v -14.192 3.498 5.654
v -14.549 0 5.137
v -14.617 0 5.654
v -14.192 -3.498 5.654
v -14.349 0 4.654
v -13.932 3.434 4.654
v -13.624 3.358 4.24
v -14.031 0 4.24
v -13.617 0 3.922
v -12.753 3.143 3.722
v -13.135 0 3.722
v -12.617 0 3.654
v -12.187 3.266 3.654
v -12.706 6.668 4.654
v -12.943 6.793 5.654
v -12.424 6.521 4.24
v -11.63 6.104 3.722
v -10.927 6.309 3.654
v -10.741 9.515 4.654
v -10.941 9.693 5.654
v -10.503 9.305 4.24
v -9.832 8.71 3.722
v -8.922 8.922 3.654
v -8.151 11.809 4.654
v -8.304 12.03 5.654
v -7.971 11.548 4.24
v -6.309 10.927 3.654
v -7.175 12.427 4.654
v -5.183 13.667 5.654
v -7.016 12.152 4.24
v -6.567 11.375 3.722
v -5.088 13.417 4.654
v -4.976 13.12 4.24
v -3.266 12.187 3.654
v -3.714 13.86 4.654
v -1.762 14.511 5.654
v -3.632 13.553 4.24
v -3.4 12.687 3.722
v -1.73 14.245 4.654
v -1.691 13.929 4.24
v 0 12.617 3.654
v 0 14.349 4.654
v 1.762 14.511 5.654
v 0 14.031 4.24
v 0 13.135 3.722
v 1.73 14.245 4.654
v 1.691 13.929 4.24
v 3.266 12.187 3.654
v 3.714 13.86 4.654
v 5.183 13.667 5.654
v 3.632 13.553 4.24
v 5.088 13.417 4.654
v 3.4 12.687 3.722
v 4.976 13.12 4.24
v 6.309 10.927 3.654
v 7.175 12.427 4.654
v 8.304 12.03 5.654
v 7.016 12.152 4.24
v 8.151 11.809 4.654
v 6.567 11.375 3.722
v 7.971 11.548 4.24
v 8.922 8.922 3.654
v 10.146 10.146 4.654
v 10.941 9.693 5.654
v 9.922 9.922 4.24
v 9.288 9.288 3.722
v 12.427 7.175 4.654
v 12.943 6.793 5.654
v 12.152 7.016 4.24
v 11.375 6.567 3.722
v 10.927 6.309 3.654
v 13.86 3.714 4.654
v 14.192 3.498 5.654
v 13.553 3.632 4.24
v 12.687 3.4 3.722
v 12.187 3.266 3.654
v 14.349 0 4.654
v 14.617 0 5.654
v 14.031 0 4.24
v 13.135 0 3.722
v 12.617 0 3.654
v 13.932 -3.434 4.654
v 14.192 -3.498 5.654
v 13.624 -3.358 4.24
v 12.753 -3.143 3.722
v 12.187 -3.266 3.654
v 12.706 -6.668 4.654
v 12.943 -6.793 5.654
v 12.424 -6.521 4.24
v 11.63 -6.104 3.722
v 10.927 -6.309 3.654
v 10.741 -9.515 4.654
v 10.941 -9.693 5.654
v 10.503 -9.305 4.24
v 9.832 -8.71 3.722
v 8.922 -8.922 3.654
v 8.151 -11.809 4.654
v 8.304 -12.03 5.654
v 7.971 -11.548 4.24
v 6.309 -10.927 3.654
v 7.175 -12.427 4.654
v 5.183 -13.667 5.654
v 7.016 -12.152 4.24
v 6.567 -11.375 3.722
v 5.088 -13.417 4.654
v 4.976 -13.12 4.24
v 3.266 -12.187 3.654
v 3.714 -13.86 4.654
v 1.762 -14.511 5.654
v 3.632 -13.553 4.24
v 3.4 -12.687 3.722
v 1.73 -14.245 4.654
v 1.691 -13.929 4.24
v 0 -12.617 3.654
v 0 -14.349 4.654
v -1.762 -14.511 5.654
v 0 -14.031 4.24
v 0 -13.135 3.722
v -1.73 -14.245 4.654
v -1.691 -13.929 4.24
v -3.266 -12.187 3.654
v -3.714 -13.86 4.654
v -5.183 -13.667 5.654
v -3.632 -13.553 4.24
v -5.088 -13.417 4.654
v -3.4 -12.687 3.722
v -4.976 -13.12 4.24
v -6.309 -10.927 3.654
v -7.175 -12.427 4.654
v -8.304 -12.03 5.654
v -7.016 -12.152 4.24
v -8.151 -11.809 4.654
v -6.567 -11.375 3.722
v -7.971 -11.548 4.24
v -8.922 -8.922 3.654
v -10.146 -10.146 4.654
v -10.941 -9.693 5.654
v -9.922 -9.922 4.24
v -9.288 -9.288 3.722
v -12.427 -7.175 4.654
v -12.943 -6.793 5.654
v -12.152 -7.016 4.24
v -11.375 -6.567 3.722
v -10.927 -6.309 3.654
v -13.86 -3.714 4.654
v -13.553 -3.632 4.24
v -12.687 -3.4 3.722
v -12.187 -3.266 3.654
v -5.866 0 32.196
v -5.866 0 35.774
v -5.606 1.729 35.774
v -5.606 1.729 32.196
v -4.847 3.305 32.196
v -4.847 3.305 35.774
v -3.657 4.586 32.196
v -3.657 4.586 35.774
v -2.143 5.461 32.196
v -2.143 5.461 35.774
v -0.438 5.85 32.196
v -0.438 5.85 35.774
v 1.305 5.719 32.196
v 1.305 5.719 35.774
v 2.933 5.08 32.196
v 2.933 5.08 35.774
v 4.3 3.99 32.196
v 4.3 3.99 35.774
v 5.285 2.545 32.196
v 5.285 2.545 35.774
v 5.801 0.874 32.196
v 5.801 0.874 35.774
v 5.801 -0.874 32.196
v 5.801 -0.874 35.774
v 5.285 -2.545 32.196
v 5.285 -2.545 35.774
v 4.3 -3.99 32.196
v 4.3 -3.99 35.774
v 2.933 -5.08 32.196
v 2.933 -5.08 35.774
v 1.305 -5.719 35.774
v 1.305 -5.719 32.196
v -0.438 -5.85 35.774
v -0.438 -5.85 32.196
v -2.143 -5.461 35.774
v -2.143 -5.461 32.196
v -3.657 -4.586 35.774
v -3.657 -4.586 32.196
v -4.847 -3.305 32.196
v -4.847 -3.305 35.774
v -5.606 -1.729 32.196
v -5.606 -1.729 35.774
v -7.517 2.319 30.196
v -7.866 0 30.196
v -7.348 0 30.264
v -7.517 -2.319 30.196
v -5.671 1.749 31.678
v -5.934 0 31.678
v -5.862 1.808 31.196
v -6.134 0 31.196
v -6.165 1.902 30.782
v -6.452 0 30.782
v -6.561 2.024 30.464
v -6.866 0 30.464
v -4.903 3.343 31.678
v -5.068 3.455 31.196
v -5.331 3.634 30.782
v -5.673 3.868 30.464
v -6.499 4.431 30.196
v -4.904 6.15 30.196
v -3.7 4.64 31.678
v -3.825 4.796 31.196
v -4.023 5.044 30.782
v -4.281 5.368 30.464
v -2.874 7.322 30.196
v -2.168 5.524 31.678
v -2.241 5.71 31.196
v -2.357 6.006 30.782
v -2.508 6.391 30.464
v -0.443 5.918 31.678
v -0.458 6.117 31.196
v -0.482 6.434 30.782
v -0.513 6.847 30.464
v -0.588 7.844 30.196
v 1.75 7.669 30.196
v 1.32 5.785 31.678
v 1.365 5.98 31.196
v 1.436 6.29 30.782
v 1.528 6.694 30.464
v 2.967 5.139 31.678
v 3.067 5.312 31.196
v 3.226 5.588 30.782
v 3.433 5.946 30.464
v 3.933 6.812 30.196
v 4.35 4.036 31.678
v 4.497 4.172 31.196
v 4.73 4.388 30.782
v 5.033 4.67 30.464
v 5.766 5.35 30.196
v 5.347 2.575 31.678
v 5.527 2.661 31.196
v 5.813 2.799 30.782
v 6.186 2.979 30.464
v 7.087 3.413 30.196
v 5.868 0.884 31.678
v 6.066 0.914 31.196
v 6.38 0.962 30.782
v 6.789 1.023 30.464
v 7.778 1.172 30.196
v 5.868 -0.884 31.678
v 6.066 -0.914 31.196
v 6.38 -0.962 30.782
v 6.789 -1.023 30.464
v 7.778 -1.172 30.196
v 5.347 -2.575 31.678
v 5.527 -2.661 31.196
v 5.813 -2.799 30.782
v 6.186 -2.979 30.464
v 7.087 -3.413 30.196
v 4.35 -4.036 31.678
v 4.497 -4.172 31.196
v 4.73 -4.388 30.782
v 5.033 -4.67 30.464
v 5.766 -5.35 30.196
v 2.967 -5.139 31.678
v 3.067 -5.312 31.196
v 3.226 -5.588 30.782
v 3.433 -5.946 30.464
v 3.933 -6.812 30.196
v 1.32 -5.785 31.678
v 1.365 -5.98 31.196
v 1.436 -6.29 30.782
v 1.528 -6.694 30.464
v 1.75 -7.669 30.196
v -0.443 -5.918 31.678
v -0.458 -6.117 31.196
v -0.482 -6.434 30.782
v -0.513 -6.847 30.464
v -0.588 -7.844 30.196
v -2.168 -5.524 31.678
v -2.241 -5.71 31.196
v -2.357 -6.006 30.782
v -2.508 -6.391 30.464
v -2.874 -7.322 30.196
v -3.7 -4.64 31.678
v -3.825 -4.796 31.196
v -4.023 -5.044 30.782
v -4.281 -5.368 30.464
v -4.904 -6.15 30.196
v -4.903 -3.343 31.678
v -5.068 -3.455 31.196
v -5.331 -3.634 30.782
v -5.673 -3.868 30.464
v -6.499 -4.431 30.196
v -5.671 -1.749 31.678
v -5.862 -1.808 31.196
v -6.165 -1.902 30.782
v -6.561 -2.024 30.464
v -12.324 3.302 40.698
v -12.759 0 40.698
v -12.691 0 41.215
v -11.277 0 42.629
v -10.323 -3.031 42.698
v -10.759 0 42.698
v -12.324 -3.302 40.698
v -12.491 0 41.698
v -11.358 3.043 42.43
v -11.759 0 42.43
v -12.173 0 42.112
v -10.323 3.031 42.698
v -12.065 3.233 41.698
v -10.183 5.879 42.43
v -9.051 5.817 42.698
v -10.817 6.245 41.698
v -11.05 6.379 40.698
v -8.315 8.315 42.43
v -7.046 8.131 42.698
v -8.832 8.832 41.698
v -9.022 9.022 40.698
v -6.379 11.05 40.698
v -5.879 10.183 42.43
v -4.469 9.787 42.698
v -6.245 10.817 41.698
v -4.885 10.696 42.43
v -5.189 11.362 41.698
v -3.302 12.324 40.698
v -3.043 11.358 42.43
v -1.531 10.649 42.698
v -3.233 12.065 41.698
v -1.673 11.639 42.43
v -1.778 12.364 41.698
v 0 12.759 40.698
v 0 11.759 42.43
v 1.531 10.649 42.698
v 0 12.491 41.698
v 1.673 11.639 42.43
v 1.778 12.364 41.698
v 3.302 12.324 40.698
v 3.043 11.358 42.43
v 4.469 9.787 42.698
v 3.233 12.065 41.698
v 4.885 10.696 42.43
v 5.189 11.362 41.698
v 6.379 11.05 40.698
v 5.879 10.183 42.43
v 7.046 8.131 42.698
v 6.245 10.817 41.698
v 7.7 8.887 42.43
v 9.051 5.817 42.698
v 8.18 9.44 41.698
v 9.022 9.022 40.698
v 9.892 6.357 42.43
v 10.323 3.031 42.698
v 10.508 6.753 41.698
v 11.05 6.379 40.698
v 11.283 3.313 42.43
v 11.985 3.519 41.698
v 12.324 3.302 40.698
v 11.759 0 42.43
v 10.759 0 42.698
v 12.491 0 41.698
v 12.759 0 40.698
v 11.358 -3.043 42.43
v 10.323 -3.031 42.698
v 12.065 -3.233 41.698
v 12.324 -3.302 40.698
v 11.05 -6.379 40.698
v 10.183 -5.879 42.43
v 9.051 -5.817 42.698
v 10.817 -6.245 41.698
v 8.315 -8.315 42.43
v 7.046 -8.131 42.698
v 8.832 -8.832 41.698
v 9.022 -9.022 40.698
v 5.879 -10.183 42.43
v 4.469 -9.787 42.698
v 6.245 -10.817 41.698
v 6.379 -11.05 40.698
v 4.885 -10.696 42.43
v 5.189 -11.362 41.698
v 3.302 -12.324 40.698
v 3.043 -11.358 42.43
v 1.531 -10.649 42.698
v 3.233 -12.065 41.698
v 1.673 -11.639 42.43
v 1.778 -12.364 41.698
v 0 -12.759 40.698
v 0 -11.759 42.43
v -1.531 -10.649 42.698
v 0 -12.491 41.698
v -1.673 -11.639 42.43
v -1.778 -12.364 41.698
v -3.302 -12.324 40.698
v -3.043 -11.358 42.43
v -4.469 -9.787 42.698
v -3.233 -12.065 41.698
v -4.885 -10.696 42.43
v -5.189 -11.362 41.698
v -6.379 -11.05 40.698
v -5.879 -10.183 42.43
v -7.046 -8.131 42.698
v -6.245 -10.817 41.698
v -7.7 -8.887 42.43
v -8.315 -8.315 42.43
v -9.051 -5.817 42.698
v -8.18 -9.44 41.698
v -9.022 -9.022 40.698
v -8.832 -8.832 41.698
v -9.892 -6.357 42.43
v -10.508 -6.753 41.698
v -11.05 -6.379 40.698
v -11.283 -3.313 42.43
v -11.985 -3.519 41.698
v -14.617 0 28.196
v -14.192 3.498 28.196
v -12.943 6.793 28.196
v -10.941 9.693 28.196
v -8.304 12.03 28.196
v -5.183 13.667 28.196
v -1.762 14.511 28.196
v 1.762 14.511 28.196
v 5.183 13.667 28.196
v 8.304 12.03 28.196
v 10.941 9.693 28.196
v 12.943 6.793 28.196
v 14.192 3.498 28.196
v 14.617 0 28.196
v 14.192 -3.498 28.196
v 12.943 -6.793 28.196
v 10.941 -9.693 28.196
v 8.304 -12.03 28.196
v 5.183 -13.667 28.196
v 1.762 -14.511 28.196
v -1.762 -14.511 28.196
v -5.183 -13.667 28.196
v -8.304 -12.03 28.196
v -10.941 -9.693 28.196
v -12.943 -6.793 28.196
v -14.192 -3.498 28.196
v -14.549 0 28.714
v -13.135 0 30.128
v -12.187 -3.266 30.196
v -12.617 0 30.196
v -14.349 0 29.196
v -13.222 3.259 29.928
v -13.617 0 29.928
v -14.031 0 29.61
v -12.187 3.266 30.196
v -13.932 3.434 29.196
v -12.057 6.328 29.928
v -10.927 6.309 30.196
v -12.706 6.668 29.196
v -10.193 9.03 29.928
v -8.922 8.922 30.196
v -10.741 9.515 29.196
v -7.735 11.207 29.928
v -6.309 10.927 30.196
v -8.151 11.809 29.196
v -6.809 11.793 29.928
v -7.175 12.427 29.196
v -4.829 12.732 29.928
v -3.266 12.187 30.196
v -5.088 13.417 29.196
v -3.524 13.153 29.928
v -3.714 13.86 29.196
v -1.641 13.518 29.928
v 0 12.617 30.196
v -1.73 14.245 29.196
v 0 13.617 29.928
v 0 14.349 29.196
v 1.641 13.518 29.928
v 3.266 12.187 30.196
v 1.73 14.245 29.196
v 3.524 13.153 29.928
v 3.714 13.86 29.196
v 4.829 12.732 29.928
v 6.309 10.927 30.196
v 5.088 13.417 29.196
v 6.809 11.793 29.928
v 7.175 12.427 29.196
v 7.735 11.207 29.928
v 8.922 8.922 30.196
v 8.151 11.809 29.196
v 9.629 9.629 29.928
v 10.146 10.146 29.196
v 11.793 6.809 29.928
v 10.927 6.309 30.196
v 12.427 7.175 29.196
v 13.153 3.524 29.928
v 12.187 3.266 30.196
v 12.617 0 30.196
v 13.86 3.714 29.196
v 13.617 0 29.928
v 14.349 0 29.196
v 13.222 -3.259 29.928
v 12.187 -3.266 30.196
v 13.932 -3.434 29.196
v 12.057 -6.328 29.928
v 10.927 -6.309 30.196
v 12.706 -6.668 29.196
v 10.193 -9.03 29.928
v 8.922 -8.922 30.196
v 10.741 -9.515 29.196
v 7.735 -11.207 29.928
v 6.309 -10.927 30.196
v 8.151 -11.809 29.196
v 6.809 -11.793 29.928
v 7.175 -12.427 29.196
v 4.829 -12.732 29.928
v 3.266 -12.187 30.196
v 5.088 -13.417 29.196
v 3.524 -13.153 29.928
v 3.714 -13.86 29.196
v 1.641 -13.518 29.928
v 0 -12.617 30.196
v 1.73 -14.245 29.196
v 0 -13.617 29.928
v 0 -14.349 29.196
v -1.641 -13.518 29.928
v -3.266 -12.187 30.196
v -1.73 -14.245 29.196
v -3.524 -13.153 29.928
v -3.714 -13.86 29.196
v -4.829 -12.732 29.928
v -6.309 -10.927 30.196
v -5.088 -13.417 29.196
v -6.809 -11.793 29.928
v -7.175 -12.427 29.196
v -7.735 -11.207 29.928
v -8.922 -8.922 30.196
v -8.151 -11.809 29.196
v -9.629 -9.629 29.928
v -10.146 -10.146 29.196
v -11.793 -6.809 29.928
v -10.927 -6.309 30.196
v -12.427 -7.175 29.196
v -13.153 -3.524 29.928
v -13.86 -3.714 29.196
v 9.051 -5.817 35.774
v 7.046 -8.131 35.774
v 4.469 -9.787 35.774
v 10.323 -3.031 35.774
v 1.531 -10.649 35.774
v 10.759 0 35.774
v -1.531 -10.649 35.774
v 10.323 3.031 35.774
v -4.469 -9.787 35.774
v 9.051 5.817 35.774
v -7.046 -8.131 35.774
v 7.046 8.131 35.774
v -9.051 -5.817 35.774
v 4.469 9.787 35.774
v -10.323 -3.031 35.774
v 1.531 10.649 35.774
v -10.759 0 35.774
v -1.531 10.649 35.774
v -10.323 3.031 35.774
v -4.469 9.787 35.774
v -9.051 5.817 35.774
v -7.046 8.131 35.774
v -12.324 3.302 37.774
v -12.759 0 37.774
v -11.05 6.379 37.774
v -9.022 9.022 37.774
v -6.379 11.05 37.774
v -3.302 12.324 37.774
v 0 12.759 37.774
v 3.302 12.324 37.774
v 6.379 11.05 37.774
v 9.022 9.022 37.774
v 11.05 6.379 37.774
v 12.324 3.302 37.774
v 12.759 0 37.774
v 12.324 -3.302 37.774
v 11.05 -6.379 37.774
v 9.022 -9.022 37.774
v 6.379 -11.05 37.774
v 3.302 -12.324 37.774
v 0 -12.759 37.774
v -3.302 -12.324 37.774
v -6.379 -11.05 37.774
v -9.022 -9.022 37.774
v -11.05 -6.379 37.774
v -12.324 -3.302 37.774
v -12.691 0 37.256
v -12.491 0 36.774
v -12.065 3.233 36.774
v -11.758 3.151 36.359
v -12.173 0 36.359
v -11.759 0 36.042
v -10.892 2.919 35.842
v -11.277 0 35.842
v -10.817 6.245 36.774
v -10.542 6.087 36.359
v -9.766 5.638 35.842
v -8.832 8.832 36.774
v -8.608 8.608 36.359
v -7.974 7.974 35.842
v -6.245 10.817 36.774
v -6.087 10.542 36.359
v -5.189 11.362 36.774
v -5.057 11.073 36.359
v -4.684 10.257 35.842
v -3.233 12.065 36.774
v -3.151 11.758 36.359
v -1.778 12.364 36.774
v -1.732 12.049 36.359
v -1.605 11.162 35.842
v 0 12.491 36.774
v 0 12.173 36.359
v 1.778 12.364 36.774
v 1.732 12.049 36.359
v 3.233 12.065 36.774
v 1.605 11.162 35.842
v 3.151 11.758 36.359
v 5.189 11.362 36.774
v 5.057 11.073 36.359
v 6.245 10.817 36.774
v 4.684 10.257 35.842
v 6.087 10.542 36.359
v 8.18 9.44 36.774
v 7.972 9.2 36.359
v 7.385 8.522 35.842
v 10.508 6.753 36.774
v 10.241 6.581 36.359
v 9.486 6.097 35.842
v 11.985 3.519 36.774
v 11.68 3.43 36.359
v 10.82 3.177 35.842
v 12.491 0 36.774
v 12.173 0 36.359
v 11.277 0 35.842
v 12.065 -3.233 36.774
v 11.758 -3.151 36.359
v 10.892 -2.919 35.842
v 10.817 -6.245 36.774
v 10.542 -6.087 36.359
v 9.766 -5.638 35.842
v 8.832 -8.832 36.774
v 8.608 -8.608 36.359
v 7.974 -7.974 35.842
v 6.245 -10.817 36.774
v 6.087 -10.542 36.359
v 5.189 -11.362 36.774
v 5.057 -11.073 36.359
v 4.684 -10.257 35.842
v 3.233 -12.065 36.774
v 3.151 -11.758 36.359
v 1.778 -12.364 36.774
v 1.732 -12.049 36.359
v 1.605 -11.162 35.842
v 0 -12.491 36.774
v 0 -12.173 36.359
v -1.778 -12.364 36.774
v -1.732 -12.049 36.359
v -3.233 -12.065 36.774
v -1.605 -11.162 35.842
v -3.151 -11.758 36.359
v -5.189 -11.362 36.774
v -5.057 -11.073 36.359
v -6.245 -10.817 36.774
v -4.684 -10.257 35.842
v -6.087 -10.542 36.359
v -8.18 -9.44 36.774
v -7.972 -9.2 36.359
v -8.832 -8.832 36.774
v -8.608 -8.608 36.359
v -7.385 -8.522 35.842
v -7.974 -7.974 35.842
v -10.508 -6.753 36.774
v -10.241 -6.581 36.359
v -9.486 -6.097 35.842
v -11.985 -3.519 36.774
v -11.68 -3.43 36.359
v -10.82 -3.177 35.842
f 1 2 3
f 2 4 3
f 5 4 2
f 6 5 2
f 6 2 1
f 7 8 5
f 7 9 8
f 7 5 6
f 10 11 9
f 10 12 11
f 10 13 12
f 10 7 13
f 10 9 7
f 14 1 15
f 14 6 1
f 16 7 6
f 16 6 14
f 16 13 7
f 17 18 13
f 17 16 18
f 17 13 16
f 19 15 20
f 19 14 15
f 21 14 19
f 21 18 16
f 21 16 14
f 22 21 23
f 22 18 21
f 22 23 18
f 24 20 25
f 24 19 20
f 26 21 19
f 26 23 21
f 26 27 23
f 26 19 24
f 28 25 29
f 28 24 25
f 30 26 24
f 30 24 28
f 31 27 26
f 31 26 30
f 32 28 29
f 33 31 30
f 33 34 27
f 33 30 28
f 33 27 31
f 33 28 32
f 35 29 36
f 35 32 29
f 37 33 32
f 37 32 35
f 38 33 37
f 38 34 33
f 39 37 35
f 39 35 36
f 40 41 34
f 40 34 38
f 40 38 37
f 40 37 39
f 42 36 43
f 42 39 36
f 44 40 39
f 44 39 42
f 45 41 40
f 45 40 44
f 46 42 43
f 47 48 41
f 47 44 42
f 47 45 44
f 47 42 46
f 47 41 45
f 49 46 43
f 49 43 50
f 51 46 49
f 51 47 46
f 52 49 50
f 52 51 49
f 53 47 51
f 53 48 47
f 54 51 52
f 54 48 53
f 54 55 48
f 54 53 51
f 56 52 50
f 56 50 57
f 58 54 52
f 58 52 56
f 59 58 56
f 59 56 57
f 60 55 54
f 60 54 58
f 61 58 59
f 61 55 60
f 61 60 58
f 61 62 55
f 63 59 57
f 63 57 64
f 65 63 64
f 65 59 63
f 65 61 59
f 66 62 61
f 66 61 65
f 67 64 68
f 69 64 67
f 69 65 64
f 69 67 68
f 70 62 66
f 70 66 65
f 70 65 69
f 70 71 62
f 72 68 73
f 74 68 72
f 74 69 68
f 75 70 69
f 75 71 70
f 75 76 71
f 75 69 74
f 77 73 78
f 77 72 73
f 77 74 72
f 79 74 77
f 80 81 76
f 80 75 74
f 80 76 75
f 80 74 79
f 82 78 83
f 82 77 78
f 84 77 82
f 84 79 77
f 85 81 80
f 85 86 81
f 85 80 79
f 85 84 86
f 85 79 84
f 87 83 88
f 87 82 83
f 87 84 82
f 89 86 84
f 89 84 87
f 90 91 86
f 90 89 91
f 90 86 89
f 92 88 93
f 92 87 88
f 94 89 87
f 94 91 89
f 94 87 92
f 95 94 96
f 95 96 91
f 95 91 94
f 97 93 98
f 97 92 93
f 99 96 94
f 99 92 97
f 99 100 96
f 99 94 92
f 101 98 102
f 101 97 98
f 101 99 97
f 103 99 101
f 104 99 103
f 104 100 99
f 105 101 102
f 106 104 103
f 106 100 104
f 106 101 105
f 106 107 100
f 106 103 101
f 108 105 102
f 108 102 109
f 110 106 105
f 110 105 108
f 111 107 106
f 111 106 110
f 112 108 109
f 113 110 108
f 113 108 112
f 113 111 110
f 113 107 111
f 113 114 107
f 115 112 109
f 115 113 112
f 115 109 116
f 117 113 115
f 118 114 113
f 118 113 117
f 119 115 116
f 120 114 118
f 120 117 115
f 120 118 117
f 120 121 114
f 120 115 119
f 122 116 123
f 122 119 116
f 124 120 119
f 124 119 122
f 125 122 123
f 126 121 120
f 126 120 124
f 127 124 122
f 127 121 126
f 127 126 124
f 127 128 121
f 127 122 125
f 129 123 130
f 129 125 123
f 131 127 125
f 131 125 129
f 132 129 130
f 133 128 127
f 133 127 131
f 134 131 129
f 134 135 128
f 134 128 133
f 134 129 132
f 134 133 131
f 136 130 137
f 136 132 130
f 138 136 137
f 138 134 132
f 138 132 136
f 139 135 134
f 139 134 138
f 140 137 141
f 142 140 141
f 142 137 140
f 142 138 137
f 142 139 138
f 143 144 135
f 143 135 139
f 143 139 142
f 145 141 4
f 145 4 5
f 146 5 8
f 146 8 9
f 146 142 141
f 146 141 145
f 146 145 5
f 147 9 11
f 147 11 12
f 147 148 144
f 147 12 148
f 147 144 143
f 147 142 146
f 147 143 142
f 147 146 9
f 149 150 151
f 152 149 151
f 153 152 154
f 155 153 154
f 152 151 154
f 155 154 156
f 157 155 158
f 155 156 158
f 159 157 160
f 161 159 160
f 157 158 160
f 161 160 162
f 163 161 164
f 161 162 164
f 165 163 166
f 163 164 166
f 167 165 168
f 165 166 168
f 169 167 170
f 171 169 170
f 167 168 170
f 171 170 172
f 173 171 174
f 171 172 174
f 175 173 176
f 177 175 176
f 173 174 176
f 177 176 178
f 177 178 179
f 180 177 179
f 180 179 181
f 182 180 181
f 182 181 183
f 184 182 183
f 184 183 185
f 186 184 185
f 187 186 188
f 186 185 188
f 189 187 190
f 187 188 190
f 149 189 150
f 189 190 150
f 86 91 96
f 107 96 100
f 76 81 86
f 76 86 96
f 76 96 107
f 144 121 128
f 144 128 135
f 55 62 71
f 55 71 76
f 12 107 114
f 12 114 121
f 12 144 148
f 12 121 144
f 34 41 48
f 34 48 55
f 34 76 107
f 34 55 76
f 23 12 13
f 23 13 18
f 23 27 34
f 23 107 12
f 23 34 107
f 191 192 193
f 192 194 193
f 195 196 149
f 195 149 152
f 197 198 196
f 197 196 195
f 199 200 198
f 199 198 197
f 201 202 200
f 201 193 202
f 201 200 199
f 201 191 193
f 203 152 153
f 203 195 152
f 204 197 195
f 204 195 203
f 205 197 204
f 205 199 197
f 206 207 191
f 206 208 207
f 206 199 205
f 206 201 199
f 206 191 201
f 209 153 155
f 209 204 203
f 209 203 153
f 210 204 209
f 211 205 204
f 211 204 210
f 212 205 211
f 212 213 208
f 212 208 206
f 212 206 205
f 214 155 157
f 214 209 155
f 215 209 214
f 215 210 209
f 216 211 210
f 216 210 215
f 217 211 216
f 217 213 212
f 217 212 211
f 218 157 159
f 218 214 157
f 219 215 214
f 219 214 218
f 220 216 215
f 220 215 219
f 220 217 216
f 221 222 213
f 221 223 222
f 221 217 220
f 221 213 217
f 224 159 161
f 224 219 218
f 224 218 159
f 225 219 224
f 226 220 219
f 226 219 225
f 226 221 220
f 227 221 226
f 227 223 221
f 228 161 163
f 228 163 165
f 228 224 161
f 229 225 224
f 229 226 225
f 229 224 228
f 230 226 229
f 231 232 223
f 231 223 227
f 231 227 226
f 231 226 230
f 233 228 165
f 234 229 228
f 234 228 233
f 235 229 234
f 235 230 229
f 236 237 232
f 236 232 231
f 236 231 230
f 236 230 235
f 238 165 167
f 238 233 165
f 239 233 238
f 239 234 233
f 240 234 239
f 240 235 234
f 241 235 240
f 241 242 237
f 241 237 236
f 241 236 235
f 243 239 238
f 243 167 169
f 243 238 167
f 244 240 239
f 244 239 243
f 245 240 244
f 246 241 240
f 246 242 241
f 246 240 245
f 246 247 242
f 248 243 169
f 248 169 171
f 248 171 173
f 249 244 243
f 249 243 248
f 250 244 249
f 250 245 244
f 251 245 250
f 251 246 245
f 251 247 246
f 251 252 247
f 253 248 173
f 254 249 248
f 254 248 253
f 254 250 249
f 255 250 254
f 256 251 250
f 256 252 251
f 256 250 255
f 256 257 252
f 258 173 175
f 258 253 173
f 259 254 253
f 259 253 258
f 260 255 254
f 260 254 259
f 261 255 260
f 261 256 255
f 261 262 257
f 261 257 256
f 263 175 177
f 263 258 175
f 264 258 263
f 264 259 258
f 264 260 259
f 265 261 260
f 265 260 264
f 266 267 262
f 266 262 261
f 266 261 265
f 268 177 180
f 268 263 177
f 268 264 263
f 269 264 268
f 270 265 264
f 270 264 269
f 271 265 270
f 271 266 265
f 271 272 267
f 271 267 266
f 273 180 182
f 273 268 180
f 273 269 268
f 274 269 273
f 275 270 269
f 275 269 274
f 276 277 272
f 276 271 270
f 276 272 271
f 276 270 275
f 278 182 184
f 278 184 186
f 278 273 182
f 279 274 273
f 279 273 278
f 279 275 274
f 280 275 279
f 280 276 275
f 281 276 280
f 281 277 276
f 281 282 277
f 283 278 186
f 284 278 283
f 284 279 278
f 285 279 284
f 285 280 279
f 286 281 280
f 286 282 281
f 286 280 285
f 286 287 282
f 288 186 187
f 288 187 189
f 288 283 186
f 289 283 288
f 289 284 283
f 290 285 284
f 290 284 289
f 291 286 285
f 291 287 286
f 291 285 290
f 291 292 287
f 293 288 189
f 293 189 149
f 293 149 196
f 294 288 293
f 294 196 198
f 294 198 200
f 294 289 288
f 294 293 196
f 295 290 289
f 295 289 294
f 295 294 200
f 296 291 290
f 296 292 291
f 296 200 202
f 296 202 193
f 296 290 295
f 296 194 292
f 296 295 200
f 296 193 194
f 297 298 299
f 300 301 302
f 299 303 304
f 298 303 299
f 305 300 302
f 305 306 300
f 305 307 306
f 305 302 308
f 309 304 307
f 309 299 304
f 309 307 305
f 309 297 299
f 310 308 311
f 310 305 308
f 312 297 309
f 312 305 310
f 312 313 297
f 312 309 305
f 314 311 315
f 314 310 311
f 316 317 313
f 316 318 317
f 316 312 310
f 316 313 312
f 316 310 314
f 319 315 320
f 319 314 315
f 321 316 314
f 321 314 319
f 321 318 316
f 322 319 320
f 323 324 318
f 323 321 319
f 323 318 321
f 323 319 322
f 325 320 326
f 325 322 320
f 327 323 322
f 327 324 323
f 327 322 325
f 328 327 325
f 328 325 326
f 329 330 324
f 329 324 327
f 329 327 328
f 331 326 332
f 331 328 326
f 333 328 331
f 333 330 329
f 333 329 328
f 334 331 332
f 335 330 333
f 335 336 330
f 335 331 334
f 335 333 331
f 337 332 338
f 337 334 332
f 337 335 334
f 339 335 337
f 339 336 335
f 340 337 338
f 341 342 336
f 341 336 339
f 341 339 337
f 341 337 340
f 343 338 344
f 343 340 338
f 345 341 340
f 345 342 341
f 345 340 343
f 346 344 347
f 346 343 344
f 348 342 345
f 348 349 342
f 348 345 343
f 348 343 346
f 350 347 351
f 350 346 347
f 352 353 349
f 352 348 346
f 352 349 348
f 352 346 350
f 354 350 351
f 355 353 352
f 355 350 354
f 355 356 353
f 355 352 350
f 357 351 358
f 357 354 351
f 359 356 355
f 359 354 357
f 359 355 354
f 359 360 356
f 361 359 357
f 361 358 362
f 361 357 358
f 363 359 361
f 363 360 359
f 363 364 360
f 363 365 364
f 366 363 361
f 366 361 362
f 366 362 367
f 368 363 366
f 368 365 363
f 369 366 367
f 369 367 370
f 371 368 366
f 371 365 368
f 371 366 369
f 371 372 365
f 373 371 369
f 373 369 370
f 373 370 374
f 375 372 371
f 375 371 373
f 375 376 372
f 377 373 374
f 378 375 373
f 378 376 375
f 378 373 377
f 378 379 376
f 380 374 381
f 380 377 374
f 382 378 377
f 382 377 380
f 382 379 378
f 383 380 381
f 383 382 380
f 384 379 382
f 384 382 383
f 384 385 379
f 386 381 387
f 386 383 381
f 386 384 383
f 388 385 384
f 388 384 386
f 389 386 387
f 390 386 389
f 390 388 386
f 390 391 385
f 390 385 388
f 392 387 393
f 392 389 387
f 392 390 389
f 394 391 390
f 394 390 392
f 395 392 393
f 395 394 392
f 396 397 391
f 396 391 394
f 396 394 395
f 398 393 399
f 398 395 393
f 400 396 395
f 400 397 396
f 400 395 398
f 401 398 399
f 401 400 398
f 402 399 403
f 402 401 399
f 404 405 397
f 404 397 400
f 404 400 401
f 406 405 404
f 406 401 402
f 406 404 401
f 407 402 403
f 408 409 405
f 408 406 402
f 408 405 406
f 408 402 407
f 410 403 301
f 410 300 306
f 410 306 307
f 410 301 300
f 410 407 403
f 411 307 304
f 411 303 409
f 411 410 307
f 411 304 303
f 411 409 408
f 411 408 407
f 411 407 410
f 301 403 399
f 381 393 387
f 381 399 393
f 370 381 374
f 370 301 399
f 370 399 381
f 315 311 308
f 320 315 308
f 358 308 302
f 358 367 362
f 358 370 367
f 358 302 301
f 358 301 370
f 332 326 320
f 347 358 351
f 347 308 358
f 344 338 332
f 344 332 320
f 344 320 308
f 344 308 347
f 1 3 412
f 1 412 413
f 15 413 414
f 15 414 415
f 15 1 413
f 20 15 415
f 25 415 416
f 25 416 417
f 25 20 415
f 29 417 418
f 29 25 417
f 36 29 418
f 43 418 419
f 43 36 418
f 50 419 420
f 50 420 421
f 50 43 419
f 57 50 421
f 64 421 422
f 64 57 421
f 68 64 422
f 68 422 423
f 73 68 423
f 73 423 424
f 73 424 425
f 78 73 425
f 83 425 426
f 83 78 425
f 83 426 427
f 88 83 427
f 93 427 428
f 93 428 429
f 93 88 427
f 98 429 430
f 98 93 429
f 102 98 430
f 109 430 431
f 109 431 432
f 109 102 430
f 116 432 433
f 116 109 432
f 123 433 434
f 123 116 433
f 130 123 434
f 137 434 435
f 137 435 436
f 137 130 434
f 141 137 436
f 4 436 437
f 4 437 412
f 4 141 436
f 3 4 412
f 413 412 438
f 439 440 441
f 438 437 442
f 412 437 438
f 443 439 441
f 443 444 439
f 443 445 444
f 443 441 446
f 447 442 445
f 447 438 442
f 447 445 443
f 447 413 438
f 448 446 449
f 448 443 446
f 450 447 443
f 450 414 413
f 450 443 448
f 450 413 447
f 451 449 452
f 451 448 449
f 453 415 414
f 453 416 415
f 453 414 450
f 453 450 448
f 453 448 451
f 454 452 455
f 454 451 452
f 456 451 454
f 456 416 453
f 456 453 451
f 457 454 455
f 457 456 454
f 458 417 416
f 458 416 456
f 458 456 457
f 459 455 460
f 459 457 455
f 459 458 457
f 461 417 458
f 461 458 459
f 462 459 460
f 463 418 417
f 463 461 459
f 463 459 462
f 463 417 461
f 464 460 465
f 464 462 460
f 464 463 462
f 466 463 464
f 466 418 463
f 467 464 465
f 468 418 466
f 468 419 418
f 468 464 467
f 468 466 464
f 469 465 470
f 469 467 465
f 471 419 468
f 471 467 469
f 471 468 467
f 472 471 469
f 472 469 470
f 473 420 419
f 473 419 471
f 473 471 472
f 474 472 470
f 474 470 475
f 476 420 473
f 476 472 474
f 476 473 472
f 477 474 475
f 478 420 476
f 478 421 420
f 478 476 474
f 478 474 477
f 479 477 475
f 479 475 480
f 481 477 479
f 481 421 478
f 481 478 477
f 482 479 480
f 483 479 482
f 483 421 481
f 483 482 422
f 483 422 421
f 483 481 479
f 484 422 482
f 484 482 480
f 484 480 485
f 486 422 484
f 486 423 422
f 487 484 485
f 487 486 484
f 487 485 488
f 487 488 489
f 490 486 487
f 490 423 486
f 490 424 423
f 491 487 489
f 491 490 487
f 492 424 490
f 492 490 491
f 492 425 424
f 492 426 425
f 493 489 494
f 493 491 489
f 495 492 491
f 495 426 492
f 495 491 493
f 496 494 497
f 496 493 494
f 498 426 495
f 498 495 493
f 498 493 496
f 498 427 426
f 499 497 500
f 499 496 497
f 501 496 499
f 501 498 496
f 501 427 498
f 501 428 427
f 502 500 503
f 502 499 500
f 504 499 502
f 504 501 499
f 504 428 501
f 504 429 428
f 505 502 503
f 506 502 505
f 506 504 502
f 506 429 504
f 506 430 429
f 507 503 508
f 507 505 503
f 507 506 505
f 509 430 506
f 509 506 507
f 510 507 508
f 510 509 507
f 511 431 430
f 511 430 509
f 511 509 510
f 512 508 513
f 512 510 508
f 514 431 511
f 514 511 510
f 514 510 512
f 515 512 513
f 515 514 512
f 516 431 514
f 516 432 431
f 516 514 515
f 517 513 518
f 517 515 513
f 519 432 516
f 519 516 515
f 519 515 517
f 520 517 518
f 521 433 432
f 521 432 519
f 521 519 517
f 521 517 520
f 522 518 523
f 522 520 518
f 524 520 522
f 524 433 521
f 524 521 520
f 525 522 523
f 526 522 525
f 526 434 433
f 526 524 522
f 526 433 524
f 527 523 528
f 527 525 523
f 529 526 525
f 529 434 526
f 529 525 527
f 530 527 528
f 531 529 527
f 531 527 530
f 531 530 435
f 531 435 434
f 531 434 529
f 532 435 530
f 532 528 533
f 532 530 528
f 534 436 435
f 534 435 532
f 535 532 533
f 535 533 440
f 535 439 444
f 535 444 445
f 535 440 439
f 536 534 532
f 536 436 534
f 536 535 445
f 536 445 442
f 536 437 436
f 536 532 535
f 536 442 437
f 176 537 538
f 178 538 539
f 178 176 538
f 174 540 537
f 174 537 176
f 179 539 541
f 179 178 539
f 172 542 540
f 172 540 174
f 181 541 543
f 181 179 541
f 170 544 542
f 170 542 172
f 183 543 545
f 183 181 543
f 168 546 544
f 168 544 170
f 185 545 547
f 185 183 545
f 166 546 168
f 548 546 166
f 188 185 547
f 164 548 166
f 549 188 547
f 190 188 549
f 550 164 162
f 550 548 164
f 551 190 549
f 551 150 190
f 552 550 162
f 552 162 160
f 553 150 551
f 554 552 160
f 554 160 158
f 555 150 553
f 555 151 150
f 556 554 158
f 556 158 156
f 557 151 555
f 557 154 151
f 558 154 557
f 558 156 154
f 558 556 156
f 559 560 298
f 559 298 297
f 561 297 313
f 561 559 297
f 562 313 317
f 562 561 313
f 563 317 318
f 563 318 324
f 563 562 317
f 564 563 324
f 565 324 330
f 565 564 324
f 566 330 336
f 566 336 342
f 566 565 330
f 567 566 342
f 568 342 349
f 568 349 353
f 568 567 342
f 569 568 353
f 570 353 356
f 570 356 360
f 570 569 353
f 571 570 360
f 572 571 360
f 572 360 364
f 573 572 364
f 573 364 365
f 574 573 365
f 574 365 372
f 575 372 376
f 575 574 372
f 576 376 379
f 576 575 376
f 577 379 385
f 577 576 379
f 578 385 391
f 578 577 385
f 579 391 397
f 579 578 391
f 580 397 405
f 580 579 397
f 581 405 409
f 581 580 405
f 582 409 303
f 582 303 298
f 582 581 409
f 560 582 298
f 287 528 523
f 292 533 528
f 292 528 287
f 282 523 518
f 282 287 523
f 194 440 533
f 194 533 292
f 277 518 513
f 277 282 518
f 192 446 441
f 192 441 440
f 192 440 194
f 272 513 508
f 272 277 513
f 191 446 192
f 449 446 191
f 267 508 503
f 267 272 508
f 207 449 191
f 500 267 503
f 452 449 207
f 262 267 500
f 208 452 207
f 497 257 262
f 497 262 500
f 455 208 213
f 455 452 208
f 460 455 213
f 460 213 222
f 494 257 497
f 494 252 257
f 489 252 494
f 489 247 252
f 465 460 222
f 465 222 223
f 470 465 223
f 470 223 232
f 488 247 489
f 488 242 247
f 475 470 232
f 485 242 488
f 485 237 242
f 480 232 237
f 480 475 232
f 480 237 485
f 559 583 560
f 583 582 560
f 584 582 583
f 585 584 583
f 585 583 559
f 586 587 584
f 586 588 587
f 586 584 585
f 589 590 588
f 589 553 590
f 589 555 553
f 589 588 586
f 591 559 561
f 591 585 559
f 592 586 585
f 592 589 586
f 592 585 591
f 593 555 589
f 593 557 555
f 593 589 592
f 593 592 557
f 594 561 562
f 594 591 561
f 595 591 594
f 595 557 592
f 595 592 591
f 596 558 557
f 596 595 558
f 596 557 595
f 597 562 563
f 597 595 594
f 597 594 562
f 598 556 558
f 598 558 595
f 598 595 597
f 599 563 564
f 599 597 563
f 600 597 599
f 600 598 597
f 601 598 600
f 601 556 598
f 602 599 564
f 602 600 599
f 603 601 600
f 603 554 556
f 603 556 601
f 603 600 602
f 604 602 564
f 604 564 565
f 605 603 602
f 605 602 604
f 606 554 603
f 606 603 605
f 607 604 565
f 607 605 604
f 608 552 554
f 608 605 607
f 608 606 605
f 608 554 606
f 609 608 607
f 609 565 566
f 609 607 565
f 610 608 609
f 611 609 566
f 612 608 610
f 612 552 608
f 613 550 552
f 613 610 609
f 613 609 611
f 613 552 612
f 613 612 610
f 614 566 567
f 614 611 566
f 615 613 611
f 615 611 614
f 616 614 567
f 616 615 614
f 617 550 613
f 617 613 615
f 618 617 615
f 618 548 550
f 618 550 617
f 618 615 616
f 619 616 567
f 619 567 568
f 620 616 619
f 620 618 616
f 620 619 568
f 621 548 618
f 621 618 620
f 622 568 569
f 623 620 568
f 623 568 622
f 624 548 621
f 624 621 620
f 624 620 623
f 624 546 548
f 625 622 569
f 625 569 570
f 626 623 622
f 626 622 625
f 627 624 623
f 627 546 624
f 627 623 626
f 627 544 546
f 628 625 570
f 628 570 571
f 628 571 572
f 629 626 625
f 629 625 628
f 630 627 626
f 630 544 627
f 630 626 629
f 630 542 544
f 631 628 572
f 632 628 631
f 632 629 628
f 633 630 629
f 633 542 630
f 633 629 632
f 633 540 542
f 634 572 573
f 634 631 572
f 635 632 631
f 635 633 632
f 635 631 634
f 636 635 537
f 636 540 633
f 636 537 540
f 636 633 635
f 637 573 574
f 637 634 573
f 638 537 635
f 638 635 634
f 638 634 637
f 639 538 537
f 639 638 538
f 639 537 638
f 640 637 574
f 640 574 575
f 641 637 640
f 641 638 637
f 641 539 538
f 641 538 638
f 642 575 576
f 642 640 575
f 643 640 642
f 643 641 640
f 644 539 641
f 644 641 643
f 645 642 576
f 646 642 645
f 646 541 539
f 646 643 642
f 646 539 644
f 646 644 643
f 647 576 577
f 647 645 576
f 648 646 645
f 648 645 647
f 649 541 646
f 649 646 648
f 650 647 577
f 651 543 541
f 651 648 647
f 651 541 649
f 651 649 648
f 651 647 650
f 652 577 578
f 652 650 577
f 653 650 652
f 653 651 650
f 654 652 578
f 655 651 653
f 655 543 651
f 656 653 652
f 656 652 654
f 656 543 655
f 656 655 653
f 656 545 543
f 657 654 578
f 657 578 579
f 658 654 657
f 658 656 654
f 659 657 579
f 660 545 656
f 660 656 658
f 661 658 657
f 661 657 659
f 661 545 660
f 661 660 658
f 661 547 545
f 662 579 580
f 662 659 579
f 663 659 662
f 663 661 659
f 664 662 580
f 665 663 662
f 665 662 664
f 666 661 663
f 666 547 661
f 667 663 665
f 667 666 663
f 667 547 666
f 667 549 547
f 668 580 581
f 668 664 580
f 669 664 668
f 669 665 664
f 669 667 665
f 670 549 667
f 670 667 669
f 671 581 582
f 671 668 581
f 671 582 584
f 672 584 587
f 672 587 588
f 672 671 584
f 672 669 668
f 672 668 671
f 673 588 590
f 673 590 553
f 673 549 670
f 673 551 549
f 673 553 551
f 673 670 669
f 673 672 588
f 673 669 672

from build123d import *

# Parameters (mm, degrees)
F0_W = 5.8661173098
F0_H = 5.5776182562
F2_R = 2
F3_R = 2


# Not quite as in the source:
# - a feature of the source that left no trace in its solid (it failed there, or was rolled back) is left out


with BuildPart() as f1:
    # F0 (on Front) → F1 (revolve)
    with BuildSketch(Plane.XZ):
        Polygon((0, 35.7737019658), (0, 42.6976457238), (-12.7588799223, 42.6976457238), (-12.7588799223, 35.7737019658), (-5.8661173098, 35.7737019658), align=None)
        with Locations((-2.9330586549, 32.9848928377)):
            Rectangle(F0_W, F0_H)
        Polygon((0, 3.6543027963), (0, 30.1960837096), (-5.8661173098, 30.1960837096), (-14.617213048, 30.1960837096), (-14.617213048, 3.6543027963), align=None)
    revolve(axis=Axis((0, 0, 23.1759742601), (0, 0, -1)))

    # F2
    f2_edges = [f1.edges().sort_by_distance(p)[0] for p in [
        (12.75888, 0, 42.697646),
        (5.866117, 0, 30.196084),
        (14.617213, 0, 30.196084),
    ]]
    fillet(f2_edges, radius=F2_R)

    # F3
    f3_edges = [f1.edges().sort_by_distance(p)[0] for p in [
        (12.75888, 0, 35.773702),
        (14.617213, 0, 3.654303),
    ]]
    fillet(f3_edges, radius=F3_R)


solid = f1.part
